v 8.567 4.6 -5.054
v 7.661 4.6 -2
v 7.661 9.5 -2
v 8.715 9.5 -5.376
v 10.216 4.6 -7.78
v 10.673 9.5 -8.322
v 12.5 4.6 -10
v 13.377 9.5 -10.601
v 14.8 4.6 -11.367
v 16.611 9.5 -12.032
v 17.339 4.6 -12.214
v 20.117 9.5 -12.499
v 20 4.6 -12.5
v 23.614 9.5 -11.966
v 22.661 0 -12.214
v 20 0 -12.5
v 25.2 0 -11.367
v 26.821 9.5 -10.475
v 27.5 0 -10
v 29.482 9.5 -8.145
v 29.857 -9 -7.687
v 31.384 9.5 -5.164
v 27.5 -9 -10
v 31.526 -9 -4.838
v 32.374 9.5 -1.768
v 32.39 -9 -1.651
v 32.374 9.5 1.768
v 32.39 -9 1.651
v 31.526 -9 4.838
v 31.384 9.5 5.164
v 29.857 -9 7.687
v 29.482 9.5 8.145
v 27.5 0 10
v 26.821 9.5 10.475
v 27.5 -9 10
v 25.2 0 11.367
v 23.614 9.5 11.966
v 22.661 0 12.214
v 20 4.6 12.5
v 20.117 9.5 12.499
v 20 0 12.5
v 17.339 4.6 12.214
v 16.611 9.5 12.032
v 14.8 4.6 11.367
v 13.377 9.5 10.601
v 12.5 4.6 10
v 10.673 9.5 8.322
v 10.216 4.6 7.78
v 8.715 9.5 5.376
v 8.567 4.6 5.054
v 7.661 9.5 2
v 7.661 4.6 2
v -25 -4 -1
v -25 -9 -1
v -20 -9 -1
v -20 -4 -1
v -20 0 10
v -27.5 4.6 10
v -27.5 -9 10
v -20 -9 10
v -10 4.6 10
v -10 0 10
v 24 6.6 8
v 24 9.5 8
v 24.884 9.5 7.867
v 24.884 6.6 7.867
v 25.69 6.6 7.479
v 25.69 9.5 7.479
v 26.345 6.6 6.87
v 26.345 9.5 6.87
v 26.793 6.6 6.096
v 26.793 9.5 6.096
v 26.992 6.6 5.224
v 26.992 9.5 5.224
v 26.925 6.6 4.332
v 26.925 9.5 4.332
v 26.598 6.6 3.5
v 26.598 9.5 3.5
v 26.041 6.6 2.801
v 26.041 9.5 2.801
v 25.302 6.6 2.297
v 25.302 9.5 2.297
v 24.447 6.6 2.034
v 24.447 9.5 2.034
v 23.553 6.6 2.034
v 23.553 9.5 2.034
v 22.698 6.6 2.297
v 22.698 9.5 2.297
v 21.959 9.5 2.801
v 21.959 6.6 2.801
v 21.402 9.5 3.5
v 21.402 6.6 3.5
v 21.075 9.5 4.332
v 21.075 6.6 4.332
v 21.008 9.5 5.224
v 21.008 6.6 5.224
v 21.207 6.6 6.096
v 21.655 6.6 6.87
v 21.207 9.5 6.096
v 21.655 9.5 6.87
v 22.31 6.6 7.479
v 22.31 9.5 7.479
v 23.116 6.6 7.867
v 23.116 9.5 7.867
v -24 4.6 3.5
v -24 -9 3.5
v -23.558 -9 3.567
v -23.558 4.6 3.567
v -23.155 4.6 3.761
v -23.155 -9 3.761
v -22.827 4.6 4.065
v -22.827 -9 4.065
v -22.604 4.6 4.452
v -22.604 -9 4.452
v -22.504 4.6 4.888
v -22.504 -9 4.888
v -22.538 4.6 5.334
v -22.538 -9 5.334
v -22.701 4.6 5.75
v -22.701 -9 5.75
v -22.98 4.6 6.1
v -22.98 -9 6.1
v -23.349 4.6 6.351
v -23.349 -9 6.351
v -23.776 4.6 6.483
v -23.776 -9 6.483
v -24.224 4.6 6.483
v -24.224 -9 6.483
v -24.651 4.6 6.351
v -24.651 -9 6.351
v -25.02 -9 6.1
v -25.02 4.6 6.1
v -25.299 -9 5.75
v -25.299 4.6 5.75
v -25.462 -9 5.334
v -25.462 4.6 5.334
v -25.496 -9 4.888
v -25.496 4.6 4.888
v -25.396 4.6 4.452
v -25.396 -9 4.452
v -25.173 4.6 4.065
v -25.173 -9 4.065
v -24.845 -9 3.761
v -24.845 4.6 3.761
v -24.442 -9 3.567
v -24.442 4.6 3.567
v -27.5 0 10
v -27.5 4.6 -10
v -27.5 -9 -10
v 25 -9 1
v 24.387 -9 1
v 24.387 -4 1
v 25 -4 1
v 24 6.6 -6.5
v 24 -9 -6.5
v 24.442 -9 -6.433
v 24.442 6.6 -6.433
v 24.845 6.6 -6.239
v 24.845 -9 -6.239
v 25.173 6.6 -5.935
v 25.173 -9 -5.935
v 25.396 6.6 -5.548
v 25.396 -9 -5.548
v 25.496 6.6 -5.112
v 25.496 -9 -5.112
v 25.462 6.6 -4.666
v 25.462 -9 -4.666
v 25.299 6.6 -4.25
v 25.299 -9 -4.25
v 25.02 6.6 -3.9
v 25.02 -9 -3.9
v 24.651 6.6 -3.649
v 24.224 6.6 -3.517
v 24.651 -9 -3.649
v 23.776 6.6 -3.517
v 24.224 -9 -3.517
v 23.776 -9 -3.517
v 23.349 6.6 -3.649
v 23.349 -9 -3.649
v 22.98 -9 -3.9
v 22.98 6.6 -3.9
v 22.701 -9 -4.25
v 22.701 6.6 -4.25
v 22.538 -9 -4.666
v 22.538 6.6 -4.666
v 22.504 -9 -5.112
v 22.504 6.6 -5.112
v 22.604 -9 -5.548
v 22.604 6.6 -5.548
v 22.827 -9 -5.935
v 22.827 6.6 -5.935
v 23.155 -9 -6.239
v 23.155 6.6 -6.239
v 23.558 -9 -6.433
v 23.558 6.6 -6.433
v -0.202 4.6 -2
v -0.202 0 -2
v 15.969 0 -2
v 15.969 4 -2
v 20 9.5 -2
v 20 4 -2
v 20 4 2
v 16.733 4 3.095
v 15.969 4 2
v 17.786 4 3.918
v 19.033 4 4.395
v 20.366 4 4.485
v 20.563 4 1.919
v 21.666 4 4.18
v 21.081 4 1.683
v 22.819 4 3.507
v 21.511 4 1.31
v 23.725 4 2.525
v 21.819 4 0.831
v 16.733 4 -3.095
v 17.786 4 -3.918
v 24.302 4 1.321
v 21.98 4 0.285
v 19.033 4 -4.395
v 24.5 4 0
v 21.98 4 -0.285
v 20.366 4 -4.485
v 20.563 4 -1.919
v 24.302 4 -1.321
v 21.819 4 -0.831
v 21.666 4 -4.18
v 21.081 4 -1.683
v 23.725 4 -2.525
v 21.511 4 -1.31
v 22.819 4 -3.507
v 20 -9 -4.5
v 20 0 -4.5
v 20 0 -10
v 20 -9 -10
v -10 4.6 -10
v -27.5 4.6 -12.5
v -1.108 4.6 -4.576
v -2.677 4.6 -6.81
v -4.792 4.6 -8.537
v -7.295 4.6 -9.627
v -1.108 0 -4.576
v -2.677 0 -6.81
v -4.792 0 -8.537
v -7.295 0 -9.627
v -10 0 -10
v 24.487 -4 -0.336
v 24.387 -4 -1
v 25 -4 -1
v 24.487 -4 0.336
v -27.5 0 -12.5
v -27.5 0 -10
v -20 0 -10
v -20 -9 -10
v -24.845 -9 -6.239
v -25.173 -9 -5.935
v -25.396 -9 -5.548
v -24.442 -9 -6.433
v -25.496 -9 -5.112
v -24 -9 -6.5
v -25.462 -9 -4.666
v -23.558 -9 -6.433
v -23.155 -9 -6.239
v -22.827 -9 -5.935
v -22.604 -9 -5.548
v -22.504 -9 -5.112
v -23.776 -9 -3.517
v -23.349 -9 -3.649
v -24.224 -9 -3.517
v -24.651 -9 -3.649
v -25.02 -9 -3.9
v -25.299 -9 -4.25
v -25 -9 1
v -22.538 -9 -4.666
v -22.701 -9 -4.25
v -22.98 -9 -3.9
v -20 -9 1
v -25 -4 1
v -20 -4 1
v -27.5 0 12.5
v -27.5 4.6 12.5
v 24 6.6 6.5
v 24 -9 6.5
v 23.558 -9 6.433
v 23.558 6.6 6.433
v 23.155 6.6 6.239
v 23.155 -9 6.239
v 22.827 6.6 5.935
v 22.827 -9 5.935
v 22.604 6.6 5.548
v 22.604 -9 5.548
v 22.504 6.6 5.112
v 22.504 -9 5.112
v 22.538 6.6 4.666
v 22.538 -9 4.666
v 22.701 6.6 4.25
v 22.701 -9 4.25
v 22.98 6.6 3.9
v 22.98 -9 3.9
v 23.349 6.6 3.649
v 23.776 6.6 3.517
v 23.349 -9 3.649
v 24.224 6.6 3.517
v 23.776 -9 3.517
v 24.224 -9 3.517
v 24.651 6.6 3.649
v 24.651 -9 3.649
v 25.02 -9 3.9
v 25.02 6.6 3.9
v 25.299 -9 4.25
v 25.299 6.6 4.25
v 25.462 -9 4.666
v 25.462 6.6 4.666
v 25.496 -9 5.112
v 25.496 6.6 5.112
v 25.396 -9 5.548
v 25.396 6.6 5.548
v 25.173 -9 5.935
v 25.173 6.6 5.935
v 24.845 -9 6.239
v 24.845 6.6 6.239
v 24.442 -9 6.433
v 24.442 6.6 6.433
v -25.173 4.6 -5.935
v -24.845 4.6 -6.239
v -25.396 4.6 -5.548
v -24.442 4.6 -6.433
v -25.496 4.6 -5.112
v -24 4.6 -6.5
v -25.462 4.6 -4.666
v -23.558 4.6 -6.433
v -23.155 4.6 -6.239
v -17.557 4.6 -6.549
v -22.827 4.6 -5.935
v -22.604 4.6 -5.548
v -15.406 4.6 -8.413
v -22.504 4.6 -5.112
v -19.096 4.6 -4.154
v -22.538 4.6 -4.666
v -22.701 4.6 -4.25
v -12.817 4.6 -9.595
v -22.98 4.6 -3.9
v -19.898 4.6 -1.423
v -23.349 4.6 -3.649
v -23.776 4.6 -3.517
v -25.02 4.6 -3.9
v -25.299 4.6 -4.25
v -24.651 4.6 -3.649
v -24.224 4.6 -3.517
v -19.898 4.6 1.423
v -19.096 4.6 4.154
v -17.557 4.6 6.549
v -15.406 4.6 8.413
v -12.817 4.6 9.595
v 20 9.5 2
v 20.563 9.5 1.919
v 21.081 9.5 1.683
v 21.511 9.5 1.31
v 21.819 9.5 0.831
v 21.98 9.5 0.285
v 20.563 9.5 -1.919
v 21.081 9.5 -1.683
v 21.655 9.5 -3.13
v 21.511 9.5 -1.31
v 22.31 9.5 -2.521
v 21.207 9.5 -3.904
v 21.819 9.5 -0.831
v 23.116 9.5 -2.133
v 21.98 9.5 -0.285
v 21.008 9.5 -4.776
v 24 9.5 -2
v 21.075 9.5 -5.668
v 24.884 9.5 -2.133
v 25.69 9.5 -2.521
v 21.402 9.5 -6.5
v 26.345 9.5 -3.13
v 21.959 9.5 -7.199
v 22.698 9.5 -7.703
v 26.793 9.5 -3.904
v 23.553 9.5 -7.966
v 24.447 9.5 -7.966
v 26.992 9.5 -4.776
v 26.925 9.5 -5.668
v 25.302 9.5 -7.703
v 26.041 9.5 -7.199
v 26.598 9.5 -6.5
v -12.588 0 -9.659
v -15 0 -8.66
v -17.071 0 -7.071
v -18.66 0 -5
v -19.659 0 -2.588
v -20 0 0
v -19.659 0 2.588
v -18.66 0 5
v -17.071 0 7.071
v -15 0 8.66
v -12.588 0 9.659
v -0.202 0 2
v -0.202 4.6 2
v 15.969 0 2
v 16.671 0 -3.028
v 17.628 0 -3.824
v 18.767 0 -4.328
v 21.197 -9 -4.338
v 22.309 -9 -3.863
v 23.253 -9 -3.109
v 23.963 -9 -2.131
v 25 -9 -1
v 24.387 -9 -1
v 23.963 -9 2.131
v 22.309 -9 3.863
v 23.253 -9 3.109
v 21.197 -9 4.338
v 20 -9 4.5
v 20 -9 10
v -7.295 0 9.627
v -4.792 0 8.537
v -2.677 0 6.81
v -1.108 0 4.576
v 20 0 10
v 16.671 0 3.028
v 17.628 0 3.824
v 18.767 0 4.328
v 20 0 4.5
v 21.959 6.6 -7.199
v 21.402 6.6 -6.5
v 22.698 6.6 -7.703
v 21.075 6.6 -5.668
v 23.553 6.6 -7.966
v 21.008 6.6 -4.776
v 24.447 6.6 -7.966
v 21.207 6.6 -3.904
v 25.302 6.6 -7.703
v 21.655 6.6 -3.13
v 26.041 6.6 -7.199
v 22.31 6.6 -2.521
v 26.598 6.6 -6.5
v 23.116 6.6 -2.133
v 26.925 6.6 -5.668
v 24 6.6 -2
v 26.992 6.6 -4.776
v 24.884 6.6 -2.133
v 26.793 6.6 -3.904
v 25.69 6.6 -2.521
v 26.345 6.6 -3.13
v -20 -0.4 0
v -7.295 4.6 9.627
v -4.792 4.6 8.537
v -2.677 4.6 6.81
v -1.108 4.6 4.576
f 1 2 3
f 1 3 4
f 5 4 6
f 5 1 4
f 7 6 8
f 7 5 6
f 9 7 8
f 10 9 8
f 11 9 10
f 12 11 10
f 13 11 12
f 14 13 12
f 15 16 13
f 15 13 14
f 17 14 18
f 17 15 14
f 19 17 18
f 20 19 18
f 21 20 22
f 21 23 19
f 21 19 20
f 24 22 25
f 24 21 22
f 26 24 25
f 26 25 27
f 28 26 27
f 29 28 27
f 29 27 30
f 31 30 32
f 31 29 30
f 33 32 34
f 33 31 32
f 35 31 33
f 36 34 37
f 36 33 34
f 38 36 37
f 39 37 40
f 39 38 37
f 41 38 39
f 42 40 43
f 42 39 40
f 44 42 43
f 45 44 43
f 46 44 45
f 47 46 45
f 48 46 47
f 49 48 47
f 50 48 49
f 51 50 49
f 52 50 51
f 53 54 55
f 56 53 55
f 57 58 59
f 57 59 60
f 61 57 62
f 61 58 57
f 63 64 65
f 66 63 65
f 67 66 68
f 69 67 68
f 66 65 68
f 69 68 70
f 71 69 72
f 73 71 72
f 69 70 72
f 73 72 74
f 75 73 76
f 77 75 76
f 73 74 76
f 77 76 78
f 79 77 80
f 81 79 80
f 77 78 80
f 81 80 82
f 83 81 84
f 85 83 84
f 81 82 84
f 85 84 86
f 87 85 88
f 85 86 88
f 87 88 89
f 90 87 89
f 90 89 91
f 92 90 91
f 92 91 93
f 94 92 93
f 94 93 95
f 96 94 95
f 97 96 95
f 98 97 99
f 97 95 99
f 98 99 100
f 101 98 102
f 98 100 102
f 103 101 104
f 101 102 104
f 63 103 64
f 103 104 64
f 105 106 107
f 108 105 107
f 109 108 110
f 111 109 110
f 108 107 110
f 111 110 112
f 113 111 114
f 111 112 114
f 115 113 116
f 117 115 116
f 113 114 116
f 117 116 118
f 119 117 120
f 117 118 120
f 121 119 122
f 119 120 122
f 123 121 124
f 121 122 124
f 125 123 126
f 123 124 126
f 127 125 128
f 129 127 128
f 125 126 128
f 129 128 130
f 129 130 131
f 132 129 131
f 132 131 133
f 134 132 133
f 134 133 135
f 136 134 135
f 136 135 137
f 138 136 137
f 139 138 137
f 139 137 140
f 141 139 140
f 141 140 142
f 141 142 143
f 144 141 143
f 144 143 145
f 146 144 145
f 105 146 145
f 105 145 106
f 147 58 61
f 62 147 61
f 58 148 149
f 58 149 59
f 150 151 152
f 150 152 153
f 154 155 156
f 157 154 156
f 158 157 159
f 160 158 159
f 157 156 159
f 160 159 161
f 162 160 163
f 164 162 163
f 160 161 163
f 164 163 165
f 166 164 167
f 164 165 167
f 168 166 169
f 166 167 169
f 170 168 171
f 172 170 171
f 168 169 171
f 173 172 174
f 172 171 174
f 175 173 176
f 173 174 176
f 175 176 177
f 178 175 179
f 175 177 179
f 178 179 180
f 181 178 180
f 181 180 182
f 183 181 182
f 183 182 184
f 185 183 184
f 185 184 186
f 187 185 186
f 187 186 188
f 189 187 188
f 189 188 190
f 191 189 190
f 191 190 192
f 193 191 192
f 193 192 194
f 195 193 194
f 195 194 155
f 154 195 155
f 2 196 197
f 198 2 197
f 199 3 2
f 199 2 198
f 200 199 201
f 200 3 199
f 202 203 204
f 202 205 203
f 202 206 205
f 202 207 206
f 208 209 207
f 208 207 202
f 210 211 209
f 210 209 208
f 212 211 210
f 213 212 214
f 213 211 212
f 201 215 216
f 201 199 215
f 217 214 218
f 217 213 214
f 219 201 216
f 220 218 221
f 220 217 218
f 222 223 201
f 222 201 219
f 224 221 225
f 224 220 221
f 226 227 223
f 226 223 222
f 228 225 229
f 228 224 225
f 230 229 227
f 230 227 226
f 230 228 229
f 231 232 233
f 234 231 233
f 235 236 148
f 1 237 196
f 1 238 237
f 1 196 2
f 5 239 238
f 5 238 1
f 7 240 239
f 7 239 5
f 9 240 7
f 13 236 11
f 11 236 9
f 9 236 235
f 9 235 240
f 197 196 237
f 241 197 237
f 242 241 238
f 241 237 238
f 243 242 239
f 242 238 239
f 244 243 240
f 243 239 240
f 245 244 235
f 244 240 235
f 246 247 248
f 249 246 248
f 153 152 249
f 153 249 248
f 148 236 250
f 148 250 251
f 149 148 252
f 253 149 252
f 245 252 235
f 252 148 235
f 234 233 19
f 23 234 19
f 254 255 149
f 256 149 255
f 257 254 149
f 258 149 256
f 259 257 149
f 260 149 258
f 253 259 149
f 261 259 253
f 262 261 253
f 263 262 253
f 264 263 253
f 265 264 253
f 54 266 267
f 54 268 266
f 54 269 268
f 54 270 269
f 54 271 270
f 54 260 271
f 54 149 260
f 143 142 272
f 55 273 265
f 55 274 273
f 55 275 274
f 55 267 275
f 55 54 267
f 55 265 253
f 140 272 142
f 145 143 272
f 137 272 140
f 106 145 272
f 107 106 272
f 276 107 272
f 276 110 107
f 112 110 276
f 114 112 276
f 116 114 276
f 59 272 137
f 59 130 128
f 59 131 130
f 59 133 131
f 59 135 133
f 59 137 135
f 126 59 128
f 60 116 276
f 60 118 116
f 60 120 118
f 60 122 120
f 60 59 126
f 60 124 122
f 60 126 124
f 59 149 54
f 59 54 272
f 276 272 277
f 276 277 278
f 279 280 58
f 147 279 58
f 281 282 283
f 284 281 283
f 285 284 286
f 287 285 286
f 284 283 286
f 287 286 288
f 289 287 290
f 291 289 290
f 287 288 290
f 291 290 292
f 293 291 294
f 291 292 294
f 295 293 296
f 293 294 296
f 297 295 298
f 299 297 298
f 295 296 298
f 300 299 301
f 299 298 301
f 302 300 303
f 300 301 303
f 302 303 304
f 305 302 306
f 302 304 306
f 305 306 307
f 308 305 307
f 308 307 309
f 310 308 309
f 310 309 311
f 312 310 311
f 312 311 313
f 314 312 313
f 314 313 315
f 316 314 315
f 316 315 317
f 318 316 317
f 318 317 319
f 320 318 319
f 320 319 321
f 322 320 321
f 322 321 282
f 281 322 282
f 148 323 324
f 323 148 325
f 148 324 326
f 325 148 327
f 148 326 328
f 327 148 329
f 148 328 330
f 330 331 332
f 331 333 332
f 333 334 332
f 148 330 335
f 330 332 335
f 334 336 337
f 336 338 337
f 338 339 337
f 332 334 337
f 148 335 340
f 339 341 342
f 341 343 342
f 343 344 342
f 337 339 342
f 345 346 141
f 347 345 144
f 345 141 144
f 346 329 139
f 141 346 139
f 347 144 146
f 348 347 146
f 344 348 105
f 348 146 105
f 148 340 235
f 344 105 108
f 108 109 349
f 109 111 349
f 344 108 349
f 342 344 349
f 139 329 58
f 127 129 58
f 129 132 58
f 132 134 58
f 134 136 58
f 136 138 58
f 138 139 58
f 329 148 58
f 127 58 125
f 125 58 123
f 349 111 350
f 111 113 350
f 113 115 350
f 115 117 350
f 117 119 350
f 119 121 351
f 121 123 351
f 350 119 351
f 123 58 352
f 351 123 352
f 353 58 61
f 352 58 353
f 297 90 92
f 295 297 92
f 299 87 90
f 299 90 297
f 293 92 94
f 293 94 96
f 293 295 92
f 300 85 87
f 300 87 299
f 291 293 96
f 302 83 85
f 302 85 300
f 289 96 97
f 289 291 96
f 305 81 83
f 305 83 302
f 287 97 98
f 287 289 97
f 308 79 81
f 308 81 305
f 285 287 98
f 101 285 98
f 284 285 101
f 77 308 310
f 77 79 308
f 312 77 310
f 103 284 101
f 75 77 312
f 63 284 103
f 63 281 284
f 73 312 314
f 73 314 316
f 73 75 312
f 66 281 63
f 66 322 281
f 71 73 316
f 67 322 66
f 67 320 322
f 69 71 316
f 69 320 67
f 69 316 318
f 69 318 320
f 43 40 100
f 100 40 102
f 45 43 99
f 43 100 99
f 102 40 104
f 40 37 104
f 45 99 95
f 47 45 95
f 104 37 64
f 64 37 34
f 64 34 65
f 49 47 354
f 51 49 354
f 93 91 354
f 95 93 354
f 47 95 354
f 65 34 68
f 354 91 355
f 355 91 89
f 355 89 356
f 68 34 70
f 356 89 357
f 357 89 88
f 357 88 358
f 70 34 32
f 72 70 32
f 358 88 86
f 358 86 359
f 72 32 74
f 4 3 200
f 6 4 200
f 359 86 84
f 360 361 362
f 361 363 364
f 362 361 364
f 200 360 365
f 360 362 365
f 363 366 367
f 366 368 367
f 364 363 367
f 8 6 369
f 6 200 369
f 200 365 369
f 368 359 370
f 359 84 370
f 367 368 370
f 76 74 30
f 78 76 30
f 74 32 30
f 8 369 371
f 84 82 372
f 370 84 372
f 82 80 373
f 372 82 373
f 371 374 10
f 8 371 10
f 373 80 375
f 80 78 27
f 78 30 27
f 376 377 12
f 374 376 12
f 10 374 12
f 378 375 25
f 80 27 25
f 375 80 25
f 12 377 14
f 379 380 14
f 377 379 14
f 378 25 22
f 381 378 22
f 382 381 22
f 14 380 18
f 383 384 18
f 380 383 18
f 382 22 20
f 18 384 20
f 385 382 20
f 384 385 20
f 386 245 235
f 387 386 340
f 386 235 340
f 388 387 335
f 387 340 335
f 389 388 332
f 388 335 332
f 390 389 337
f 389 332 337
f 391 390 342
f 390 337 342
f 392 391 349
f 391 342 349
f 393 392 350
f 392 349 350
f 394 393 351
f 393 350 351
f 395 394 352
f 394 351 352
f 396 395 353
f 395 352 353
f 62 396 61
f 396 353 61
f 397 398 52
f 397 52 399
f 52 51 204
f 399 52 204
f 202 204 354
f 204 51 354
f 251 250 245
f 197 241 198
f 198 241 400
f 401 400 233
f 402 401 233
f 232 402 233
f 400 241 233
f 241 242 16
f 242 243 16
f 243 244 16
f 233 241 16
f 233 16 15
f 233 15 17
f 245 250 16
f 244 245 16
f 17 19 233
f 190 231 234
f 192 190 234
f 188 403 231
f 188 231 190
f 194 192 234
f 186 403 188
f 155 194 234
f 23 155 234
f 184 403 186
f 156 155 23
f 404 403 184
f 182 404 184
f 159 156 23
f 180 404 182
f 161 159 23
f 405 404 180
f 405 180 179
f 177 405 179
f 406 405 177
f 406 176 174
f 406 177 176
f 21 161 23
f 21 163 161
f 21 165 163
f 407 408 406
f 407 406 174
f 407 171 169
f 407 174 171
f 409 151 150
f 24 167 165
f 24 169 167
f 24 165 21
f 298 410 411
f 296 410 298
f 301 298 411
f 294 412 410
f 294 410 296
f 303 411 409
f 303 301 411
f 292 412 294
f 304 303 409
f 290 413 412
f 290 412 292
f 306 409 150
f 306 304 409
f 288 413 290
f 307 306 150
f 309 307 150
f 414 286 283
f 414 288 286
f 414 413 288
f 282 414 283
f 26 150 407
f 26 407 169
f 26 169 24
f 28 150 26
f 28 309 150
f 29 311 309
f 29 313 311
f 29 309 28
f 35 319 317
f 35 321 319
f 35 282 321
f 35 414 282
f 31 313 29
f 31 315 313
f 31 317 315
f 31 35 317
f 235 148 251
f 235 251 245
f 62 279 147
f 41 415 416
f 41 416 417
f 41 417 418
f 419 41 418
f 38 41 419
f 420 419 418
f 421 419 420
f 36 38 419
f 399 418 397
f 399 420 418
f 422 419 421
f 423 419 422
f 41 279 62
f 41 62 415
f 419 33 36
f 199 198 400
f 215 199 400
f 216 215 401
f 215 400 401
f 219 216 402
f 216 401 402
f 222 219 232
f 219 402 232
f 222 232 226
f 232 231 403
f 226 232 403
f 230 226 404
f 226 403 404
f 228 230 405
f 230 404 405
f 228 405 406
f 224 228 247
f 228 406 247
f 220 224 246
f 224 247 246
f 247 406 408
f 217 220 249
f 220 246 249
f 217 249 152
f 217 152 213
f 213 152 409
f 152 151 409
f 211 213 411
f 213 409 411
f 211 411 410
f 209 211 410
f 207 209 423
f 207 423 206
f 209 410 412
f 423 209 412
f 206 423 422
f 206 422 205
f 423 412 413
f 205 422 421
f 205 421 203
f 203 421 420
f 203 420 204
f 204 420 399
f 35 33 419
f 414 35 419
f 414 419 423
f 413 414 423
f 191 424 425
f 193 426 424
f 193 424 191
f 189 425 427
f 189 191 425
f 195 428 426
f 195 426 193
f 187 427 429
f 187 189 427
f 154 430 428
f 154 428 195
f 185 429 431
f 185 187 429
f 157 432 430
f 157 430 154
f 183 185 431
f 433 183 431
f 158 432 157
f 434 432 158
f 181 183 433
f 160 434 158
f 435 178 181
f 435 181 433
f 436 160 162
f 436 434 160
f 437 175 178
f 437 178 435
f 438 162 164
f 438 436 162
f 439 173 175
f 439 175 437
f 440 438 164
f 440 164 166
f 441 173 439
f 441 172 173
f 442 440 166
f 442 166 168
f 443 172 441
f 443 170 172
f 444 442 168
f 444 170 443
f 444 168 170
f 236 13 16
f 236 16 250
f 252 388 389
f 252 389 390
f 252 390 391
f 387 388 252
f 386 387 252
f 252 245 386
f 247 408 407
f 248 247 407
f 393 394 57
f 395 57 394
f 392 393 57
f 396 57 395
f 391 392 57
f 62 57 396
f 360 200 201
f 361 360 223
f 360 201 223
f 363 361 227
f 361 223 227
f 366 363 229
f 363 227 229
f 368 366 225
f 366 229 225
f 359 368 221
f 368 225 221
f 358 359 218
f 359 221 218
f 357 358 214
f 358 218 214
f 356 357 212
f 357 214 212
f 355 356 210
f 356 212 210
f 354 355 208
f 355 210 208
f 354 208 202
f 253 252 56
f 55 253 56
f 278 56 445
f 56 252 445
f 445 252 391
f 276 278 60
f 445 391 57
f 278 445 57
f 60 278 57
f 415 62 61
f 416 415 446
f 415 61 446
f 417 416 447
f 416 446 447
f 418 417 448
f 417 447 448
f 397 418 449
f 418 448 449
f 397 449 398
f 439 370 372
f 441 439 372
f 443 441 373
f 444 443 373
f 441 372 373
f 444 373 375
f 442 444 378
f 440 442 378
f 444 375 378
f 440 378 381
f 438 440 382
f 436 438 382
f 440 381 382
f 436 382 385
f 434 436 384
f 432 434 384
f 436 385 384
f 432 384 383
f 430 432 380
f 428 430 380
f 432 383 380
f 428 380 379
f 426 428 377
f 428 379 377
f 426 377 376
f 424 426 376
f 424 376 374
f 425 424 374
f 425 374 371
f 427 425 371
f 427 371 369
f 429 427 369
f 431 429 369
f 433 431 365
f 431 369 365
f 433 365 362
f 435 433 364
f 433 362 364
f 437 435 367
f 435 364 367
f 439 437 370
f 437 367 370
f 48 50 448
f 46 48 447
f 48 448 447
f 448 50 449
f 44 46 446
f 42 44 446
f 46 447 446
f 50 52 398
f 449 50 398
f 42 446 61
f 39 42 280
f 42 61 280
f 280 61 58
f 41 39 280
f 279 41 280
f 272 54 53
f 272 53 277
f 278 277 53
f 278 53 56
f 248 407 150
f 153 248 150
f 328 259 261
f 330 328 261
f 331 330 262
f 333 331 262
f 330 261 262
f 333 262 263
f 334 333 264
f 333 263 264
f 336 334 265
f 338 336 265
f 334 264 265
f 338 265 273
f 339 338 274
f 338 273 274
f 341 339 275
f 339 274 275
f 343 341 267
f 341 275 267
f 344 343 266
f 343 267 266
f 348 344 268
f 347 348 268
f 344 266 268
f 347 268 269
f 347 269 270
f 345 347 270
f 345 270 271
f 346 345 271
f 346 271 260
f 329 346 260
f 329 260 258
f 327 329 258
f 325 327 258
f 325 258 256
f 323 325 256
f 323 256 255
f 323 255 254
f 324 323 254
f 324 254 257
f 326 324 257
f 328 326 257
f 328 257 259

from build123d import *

# Parameters (mm, degrees)
SKETCH_1_W           = 40
SKETCH_1_H           = 20
EXTRUDE_1_DEPTH      = 4.6
SKETCH_2_R           = 6.5
CUT_EXTRUDE_1_DEPTH  = 2
SKETCH_4_R           = 5.5
CUT_EXTRUDE_5_DEPTH  = 2.6
SKETCH_5_R           = 12.5
EXTRUDE_2_DEPTH      = 9.5
SKETCH_6_R           = 4.5
CUT_EXTRUDE_6_DEPTH  = 4
SKETCH_7_R           = 2
CUT_EXTRUDE_7_DEPTH  = 36.252659474
EXTRUDE_4_DEPTH      = 9
EXTRUDE_4_DEPTH_BACK = 4.6
SKETCH_8_W           = 7.5
SKETCH_8_H           = 20
SKETCH_9_W           = 5
SKETCH_9_H           = 2
CUT_EXTRUDE_8_DEPTH  = 5
SKETCH_10_R          = 1.5
CUT_EXTRUDE_9_DEPTH  = 40.430318284
SKETCH_13_R          = 3
CUT_EXTRUDE_10_DEPTH = 2.9
SKETCH_14_W          = 24.876524617
SKETCH_14_H          = 4
CUT_EXTRUDE_11_DEPTH = 9.5
SKETCH_15_R          = 10
CUT_EXTRUDE_14_DEPTH = 5
EXTRUDE_5_DEPTH      = 4.6


with BuildPart() as part:
    # 草图1 → 凸台-拉伸1 (new body)
    with BuildSketch(Plane(origin=(0, 0, 0), x_dir=(1, 0, 0), z_dir=(0, 1, 0))):
        Rectangle(SKETCH_1_W, SKETCH_1_H)
    extrude(amount=EXTRUDE_1_DEPTH)

    # 草图2 → 切除-拉伸1 (cut)
    with BuildSketch(Plane.XZ):
        with Locations(Location((-10, 0, 0), (0, 0, 270))):
            Circle(SKETCH_2_R)
    extrude(amount=-CUT_EXTRUDE_1_DEPTH, mode=Mode.SUBTRACT)

    # 草图4 → 切除-拉伸5 (cut)
    with BuildSketch(Plane.XZ.offset(-2)):
        with Locations(Location((-10, 0, 0), (0, 0, 270))):
            Circle(SKETCH_4_R)
    extrude(amount=-CUT_EXTRUDE_5_DEPTH, mode=Mode.SUBTRACT)

    # 草图5 → 凸台-拉伸2 (add)
    with BuildSketch(Plane.XZ):
        with Locations(Location((20, 0, 0), (0, 0, 270))):
            Circle(SKETCH_5_R)
    extrude(amount=-EXTRUDE_2_DEPTH)

    # 草图6 → 切除-拉伸6 (cut)
    with BuildSketch(Plane.XZ):
        with Locations(Location((20, 0, 0), (0, 0, 270))):
            Circle(SKETCH_6_R)
    extrude(amount=-CUT_EXTRUDE_6_DEPTH, mode=Mode.SUBTRACT)

    # 草图7 → 切除-拉伸7 (cut, through all)
    with BuildSketch(Plane.XZ.offset(-4)):
        with Locations(Location((20, 0, 0), (0, 0, 270))):
            Circle(SKETCH_7_R)
    extrude(amount=-CUT_EXTRUDE_7_DEPTH, mode=Mode.SUBTRACT)

    # 草图8 → 凸台-拉伸4 (add, two sides: drawn at the far end of the back side and taken through both)
    with BuildSketch(Plane.XZ.offset(-EXTRUDE_4_DEPTH_BACK)):
        with Locations((-23.75, 0)):
            Rectangle(SKETCH_8_W, SKETCH_8_H)
        with BuildLine():
            Line((20, -4.5), (20, -10))
            Line((20, -10), (27.5, -10))
            ThreePointArc((27.5, -10), (32.5, 0), (27.5, 10))
            Line((27.5, 10), (20, 10))
            Line((20, 10), (20, 4.5))
            ThreePointArc((20, 4.5), (24.5, 0), (20, -4.5))
        make_face()
    extrude(amount=EXTRUDE_4_DEPTH + EXTRUDE_4_DEPTH_BACK)

    # 草图9 → 切除-拉伸8 (cut)
    with BuildSketch(Plane.XZ.offset(9)):
        with Locations((-22.5, 0)):
            Rectangle(SKETCH_9_W, SKETCH_9_H)
        with Locations((22.5, 0)):
            Rectangle(SKETCH_9_W, SKETCH_9_H)
    extrude(amount=-CUT_EXTRUDE_8_DEPTH, mode=Mode.SUBTRACT)

    # 草图10 → 切除-拉伸9 (cut, through all)
    with BuildSketch(Plane.XZ.offset(9)):
        with Locations(Location((-24, 5, 0), (0, 0, 270))):
            Circle(SKETCH_10_R)
        with Locations(Location((-24, -5, 0), (0, 0, 270))):
            Circle(SKETCH_10_R)
        with Locations(Location((24, -5, 0), (0, 0, 270))):
            Circle(SKETCH_10_R)
        with Locations(Location((24, 5, 0), (0, 0, 90))):
            Circle(SKETCH_10_R)
    extrude(amount=-CUT_EXTRUDE_9_DEPTH, mode=Mode.SUBTRACT)

    # 草图13 → 切除-拉伸10 (cut)
    with BuildSketch(Plane(origin=(0, 9.5, 0), x_dir=(1, 0, 0), z_dir=(0, 1, 0))):
        with Locations(Location((24, -5, 0), (0, 0, 270))):
            Circle(SKETCH_13_R)
        with Locations(Location((24, 5, 0), (0, 0, 270))):
            Circle(SKETCH_13_R)
    extrude(amount=-CUT_EXTRUDE_10_DEPTH, mode=Mode.SUBTRACT)

    # 草图14 → 切除-拉伸11 (cut)
    with BuildSketch(Plane(origin=(0, 9.5, 0), x_dir=(1, 0, 0), z_dir=(0, 1, 0))):
        with Locations((7.561737691, 0)):
            Rectangle(SKETCH_14_W, SKETCH_14_H)
    extrude(amount=-CUT_EXTRUDE_11_DEPTH, mode=Mode.SUBTRACT)

    # 草图15 → 切除-拉伸14 (cut)
    with BuildSketch(Plane(origin=(0, 4.6, 0), x_dir=(1, 0, 0), z_dir=(0, 1, 0))):
        with Locations((-10, 0)):
            Circle(SKETCH_15_R)
    extrude(amount=-CUT_EXTRUDE_14_DEPTH, mode=Mode.SUBTRACT)


with BuildPart() as cut_extrude_14_piece_1:
    # of the separate pieces the step leaves, piece 1, a body of its own (cut_extrude_14_pieces)
    add(part.part.solids().sort_by_distance((12.5, 0, -10))[0])

    # 草图16 → 凸台-拉伸5 (add)
    with BuildSketch(Plane(origin=(0, 4.6, 0), x_dir=(1, 0, 0), z_dir=(0, 1, 0))):
        with BuildLine():
            Line((20, 12.5), (-27.5, 12.5))
            Line((-27.5, 12.5), (-27.5, 10))
            Line((-27.5, 10), (12.5, 10))
            ThreePointArc((12.5, 10), (16.047152925, 11.858541226), (20, 12.5))
        make_face()
        with BuildLine():
            Line((20, -12.5), (-27.5, -12.5))
            Line((-27.5, -12.5), (-27.5, -10))
            Line((-27.5, -10), (12.5, -10))
            ThreePointArc((12.5, -10), (16.047152925, -11.858541226), (20, -12.5))
        make_face()
    extrude(amount=-EXTRUDE_5_DEPTH)


with BuildPart() as cut_extrude_14_piece_2:
    # of the separate pieces the step leaves, piece 2, a body of its own (cut_extrude_14_pieces)
    add(part.part.solids().sort_by_distance((-20, 0, -10))[0])


solid = Compound([cut_extrude_14_piece_1.part, cut_extrude_14_piece_2.part])
